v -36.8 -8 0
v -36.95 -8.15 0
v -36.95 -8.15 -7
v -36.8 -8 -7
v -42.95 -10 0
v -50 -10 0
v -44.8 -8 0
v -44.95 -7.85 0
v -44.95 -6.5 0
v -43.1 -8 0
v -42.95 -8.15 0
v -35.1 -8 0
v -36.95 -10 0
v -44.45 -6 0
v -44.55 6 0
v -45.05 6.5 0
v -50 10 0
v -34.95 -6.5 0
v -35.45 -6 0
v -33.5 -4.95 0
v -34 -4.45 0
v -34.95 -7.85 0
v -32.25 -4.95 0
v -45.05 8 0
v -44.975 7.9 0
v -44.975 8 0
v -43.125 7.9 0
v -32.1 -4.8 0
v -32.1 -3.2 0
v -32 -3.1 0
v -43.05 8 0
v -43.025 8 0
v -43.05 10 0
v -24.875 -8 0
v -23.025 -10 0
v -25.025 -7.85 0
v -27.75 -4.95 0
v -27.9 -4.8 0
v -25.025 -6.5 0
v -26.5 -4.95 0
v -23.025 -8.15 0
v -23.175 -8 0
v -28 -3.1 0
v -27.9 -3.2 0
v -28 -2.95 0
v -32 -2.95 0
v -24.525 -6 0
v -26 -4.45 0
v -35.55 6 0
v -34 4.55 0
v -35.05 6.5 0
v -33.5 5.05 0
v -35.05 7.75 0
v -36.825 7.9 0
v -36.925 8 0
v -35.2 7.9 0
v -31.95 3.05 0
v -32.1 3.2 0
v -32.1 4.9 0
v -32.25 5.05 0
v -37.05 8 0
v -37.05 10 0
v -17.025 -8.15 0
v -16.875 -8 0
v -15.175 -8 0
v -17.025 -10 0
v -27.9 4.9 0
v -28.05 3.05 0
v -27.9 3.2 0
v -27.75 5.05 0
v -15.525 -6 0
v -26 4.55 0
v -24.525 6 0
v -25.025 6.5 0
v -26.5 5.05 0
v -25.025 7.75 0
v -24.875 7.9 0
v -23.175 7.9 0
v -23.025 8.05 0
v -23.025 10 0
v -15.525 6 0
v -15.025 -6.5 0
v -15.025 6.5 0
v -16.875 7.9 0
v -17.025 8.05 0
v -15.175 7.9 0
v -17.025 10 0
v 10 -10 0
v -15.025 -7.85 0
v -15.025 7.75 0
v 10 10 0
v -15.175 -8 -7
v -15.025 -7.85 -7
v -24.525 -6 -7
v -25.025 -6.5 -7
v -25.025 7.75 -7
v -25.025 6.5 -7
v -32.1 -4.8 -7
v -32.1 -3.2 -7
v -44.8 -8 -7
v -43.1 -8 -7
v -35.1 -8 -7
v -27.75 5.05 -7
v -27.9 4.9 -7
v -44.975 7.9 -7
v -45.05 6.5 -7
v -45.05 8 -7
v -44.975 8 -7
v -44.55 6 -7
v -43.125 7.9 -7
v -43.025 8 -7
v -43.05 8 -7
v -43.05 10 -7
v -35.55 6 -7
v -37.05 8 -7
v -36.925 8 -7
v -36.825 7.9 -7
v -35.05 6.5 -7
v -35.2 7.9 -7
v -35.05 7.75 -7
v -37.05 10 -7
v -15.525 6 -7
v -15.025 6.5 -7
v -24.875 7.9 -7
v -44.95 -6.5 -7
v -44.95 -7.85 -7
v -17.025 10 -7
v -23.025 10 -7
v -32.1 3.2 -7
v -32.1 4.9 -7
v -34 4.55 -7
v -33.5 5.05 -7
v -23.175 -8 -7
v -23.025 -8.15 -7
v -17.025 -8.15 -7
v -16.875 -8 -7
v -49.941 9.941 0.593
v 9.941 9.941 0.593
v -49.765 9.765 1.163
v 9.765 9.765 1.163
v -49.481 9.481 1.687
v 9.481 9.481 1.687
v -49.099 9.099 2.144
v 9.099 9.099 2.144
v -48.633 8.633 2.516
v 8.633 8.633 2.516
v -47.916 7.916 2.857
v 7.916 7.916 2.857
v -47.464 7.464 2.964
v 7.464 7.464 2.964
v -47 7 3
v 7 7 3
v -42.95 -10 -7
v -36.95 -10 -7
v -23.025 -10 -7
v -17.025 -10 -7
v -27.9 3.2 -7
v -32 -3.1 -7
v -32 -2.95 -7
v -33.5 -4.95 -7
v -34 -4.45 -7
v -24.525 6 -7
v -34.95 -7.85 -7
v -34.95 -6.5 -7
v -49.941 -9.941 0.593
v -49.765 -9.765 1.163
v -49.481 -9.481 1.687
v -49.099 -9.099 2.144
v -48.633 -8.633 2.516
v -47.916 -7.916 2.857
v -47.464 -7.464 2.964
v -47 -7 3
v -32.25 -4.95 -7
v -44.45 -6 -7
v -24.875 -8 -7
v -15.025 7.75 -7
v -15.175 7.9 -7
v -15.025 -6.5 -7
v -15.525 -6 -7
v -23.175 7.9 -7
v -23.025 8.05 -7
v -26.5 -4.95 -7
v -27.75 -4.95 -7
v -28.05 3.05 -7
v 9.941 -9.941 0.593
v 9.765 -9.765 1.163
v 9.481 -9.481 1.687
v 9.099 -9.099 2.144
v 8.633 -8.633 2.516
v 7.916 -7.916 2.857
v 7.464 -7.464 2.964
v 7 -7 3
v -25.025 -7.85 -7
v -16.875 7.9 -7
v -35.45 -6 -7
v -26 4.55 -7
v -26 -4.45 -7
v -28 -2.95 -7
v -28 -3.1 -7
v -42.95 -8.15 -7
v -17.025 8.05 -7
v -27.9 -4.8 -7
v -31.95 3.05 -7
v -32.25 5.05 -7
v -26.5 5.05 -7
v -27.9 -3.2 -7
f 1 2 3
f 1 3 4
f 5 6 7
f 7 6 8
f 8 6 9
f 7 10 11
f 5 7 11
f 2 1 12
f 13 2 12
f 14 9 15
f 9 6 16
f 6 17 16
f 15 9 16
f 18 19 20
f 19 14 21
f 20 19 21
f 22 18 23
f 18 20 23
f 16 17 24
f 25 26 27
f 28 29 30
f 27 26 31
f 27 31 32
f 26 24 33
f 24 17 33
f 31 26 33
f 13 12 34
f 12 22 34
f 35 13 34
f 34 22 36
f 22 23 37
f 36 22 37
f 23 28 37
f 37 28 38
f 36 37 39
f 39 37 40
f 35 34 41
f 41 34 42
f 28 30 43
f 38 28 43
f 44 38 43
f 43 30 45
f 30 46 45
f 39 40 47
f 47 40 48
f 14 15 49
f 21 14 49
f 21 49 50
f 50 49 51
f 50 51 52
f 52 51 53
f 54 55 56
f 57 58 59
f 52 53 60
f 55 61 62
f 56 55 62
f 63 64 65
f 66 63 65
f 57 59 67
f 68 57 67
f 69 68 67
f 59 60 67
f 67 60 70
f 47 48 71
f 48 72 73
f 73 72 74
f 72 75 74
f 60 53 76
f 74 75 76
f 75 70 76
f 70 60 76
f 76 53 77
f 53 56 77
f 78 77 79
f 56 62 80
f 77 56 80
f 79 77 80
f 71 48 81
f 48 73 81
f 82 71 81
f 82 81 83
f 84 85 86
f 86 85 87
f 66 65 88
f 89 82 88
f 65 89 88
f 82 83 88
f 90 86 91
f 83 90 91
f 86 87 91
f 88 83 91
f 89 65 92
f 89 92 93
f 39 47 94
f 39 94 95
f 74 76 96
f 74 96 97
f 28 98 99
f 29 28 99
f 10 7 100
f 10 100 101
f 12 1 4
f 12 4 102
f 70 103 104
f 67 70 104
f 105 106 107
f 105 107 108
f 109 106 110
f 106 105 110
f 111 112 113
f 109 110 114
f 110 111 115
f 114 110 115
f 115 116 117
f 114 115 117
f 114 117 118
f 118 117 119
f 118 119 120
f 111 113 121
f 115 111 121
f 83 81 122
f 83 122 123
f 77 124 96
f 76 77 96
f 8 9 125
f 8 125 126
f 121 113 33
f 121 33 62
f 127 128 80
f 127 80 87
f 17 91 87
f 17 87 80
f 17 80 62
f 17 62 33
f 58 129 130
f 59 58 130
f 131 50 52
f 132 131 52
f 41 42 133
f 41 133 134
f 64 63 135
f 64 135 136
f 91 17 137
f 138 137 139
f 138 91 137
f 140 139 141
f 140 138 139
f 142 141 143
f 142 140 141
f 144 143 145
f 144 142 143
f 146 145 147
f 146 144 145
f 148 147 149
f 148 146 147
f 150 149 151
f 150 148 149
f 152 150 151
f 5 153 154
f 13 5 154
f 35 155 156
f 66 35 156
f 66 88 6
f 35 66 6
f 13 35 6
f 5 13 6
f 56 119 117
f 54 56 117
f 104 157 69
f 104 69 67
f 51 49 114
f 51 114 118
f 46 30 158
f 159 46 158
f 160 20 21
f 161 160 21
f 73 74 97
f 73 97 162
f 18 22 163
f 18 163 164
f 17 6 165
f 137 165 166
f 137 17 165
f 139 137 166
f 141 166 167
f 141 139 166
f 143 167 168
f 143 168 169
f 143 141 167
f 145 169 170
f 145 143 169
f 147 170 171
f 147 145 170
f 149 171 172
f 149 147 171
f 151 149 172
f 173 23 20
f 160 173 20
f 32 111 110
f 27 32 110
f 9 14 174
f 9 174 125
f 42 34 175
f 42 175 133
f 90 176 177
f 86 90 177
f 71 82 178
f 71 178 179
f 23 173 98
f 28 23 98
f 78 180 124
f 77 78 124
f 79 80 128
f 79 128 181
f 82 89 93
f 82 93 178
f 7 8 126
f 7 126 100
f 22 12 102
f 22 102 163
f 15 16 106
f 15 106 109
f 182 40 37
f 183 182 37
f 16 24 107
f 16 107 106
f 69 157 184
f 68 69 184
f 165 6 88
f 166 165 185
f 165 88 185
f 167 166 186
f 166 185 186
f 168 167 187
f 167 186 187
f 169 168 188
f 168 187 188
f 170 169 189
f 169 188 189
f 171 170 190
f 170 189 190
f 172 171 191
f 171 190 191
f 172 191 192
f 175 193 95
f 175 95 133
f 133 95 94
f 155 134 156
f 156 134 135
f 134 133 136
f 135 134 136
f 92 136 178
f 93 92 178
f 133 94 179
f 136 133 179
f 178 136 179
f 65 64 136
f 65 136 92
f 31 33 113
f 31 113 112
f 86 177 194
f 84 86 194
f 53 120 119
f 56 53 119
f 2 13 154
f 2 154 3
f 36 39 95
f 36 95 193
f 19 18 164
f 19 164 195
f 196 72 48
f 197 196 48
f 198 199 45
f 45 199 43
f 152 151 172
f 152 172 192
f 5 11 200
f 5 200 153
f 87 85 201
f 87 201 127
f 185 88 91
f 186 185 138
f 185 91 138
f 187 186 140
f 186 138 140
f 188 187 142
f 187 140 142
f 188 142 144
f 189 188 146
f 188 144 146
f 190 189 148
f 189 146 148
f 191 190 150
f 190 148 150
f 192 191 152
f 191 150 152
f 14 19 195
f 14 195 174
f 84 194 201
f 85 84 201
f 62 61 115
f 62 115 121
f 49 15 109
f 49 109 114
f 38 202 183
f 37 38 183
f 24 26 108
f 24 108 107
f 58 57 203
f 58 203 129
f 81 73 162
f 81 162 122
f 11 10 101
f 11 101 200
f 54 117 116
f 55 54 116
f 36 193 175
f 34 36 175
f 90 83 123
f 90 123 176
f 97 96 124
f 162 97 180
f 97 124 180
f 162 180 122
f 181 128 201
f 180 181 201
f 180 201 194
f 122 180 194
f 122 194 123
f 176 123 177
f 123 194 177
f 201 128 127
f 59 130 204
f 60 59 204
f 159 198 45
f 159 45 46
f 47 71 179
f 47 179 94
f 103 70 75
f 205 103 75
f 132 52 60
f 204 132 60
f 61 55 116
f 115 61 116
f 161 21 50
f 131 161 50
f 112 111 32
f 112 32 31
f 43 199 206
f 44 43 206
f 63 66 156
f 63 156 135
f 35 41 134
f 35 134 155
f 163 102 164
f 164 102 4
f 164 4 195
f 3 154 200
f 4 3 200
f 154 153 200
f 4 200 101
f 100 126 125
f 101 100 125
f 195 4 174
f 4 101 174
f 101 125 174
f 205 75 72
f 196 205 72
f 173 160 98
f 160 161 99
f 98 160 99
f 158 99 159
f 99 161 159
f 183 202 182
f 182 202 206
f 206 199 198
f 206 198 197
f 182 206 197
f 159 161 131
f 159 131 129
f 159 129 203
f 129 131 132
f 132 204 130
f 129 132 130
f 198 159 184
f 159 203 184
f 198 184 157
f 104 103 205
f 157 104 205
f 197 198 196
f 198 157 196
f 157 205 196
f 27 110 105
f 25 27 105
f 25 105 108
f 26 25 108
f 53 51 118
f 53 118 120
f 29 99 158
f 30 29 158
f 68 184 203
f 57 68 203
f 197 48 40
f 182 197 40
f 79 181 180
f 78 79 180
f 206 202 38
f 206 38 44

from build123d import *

# Parameters (mm, degrees)
SKETCH_1_W          = 60
SKETCH_1_H          = 20
EXTRUDE_1_DEPTH     = 3
EXTRUDE_3_DEPTH     = 7
SKETCH_5_W          = 2
SKETCH_5_H          = 0.1
SKETCH_5_W_2        = 4.2
SKETCH_5_H_2        = 2
CUT_EXTRUDE_2_DEPTH = 7
CHAMFER_1_SIZE      = 0.15
FILLET_1_R          = 3


# Some blends are built 0.0001 mm under size
with BuildPart() as part:
    # 草图1 → 凸台-拉伸1 (new body)
    with BuildSketch(Plane.XY):
        with Locations((-20, 0)):
            Rectangle(SKETCH_1_W, SKETCH_1_H)
    extrude(amount=EXTRUDE_1_DEPTH)

    # 草图1<5> → 凸台-拉伸3 (add)
    with BuildSketch(Plane.XY):
        Polygon((-17.025, 10), (-23.025, 10), (-23.025, 8), (-25.025, 8), (-25.025, 6.5), (-24.525, 6), (-15.525, 6), (-15.025, 6.5), (-15.025, 8), (-17.025, 8), align=None)
        Polygon((-37.05, 10), (-43.05, 10), (-43.05, 8), (-45.05, 8), (-45.05, 6.5), (-44.55, 6), (-35.55, 6), (-35.05, 6.5), (-35.05, 8), (-37.05, 8), align=None)
        Polygon((-26, 4.55), (-26, -4.45), (-26.5, -4.95), (-28, -4.95), (-28, -2.95), (-32, -2.95), (-32, -4.95), (-33.5, -4.95), (-34, -4.45), (-34, 4.55), (-33.5, 5.05), (-32, 5.05), (-32, 3.05), (-28, 3.05), (-28, 5.05), (-26.5, 5.05), align=None)
        Polygon((-23.025, -8), (-23.025, -10), (-17.025, -10), (-17.025, -8), (-15.025, -8), (-15.025, -6.5), (-15.525, -6), (-24.525, -6), (-25.025, -6.5), (-25.025, -8), align=None)
        Polygon((-42.95, -8), (-42.95, -10), (-36.95, -10), (-36.95, -8), (-34.95, -8), (-34.95, -6.5), (-35.45, -6), (-44.45, -6), (-44.95, -6.5), (-44.95, -8), align=None)
    extrude(amount=-EXTRUDE_3_DEPTH)

    # 草图5 → 切除-拉伸2 (cut)
    with BuildSketch(Plane(origin=(0, 0, -7), x_dir=(-1, 0, 0), z_dir=(0, 0, -1))):
        with Locations((16.025, 7.95)):
            Rectangle(SKETCH_5_W, SKETCH_5_H)
        with Locations((24.025, 7.95)):
            Rectangle(SKETCH_5_W, SKETCH_5_H)
        with Locations((35.975, 7.95)):
            Rectangle(SKETCH_5_W, SKETCH_5_H)
        with Locations((43.975, 7.95)):
            Rectangle(SKETCH_5_W, SKETCH_5_H)
        with Locations((30, 4.05)):
            Rectangle(SKETCH_5_W_2, SKETCH_5_H_2)
        with Locations((30, -4.05)):
            Rectangle(SKETCH_5_W_2, SKETCH_5_H_2)
    extrude(amount=-CUT_EXTRUDE_2_DEPTH, mode=Mode.SUBTRACT)

    # 倒角1
    # the kernel refuses this chamfer: 0.15 mm, written as the material it adds along each edge
    with BuildSketch(Plane(origin=(-32.1, -3.05, -7), x_dir=(-0.027495876610573042, -0.9996219169112971, 0), z_dir=(0, 0, 1))) as chamfer_1_piece_1_section:
        Polygon((CHAMFER_1_SIZE * 0.999621916911, CHAMFER_1_SIZE * 0.0274958766106), (-CHAMFER_1_SIZE * 0.0274958766106, CHAMFER_1_SIZE * 0.999621916911), (0, 0), align=None)
    chamfer_1_piece_1 = extrude(amount=7, mode=Mode.PRIVATE)
    chamfer_1_piece_1 = split(chamfer_1_piece_1, bisect_by=Plane(origin=(-32, -3.10460455, -3.5), z_dir=(-1, 0, 0)), keep=Keep.TOP, mode=Mode.PRIVATE)
    add(chamfer_1_piece_1)
    with BuildSketch(Plane(origin=(-32.1, -3.05, -7), x_dir=(-0.027495876610573042, -0.9996219169112971, 0), z_dir=(0, 0, 1))) as chamfer_1_piece_2_section:
        Polygon((CHAMFER_1_SIZE * 0.999621916911, CHAMFER_1_SIZE * 0.0274958766106), (-CHAMFER_1_SIZE * 0.0274958766106, CHAMFER_1_SIZE * 0.999621916911), (0, 0), align=None)
    chamfer_1_piece_2 = extrude(amount=7.385752448, mode=Mode.PRIVATE)
    chamfer_1_piece_2 = split(chamfer_1_piece_2, bisect_by=Plane(origin=(-32.060343707, -3.10460455, 0), z_dir=(0, 0, 1)), keep=Keep.TOP, mode=Mode.PRIVATE)
    chamfer_1_piece_2 = split(chamfer_1_piece_2, bisect_by=Plane(origin=(-32, -3.10460455, 0.192876224), z_dir=(-1, 0, 0)), keep=Keep.TOP, mode=Mode.PRIVATE)
    add(chamfer_1_piece_2)
    with BuildSketch(Plane(origin=(-32.1, -3.05, -7), x_dir=(-0.027495876610573042, -0.9996219169112971, 0), z_dir=(0, 0, 1))) as chamfer_1_piece_3_section:
        Polygon((CHAMFER_1_SIZE * 0.999621916911, CHAMFER_1_SIZE * 0.0274958766106), (-CHAMFER_1_SIZE * 0.0274958766106, CHAMFER_1_SIZE * 0.999621916911), (0, 0), align=None)
    chamfer_1_piece_3 = extrude(amount=7.385752448, mode=Mode.PRIVATE)
    chamfer_1_piece_3 = split(chamfer_1_piece_3, bisect_by=Plane(origin=(-31.98101474, -3.063087711, 0), z_dir=(0, 0, 1)), keep=Keep.TOP, mode=Mode.PRIVATE)
    chamfer_1_piece_3 = split(chamfer_1_piece_3, bisect_by=Plane(origin=(-32, -3.063087711, 0.192876224), z_dir=(1, 0, 0)), keep=Keep.TOP, mode=Mode.PRIVATE)
    add(chamfer_1_piece_3)
    with BuildSketch(Plane(origin=(-27.9, -3.05, -7), x_dir=(-0.9996219169112968, 0.027495876610587344, 0), z_dir=(0, 0, 1))) as chamfer_1_piece_4_section:
        Polygon((CHAMFER_1_SIZE * 0.999621916911, CHAMFER_1_SIZE * 0.0274958766106), (-CHAMFER_1_SIZE * 0.0274958766106, CHAMFER_1_SIZE * 0.999621916911), (0, 0), align=None)
    chamfer_1_piece_4 = extrude(amount=7, mode=Mode.PRIVATE)
    chamfer_1_piece_4 = split(chamfer_1_piece_4, bisect_by=Plane(origin=(-28, -3.10460455, -3.5), z_dir=(1, 0, 0)), keep=Keep.TOP, mode=Mode.PRIVATE)
    add(chamfer_1_piece_4)
    with BuildSketch(Plane(origin=(-27.9, -3.05, -7), x_dir=(-0.9996219169112968, 0.027495876610587344, 0), z_dir=(0, 0, 1))) as chamfer_1_piece_5_section:
        Polygon((CHAMFER_1_SIZE * 0.999621916911, CHAMFER_1_SIZE * 0.0274958766106), (-CHAMFER_1_SIZE * 0.0274958766106, CHAMFER_1_SIZE * 0.999621916911), (0, 0), align=None)
    chamfer_1_piece_5 = extrude(amount=7.385752448, mode=Mode.PRIVATE)
    chamfer_1_piece_5 = split(chamfer_1_piece_5, bisect_by=Plane(origin=(-28.01898526, -3.063087711, 0), z_dir=(0, 0, 1)), keep=Keep.TOP, mode=Mode.PRIVATE)
    chamfer_1_piece_5 = split(chamfer_1_piece_5, bisect_by=Plane(origin=(-28, -3.063087711, 0.192876224), z_dir=(-1, 0, 0)), keep=Keep.TOP, mode=Mode.PRIVATE)
    add(chamfer_1_piece_5)
    with BuildSketch(Plane(origin=(-27.9, -3.05, -7), x_dir=(-0.9996219169112968, 0.027495876610587344, 0), z_dir=(0, 0, 1))) as chamfer_1_piece_6_section:
        Polygon((CHAMFER_1_SIZE * 0.999621916911, CHAMFER_1_SIZE * 0.0274958766106), (-CHAMFER_1_SIZE * 0.0274958766106, CHAMFER_1_SIZE * 0.999621916911), (0, 0), align=None)
    chamfer_1_piece_6 = extrude(amount=7.385752448, mode=Mode.PRIVATE)
    chamfer_1_piece_6 = split(chamfer_1_piece_6, bisect_by=Plane(origin=(-27.939656293, -3.10460455, 0), z_dir=(0, 0, 1)), keep=Keep.TOP, mode=Mode.PRIVATE)
    chamfer_1_piece_6 = split(chamfer_1_piece_6, bisect_by=Plane(origin=(-28, -3.10460455, 0.192876224), z_dir=(1, 0, 0)), keep=Keep.TOP, mode=Mode.PRIVATE)
    add(chamfer_1_piece_6)
    with BuildSketch(Plane(origin=(-32.1, 3.05, -7), x_dir=(0.9996219169112968, -0.027495876610587344, 0), z_dir=(0, 0, 1)), Plane(origin=(-27.9, 3.05, -7), x_dir=(0.02749587661059597, 0.9996219169112964, 0), z_dir=(0, 0, 1)), Plane(origin=(-42.975, 7.9, -7), x_dir=(0.027495876610572963, 0.9996219169112971, 0), z_dir=(0, 0, 1)), Plane(origin=(-23.025, 7.9, -7), x_dir=(0.02749587661059597, 0.9996219169112964, 0), z_dir=(0, 0, 1)), Plane(origin=(-17.025, 7.9, -7), x_dir=(0.9996219169112968, -0.027495876610584464, 0), z_dir=(0, 0, 1))) as chamfer_1_piece_7:
        Polygon((CHAMFER_1_SIZE * 0.999621916911, CHAMFER_1_SIZE * 0.0274958766106), (-CHAMFER_1_SIZE * 0.0274958766106, CHAMFER_1_SIZE * 0.999621916911), (0, 0), align=None)
    extrude(amount=7.385752448)
    with BuildSketch(Plane(origin=(-36.975, 7.9, -7), x_dir=(0.9996219169112968, -0.0274958766105851, 0), z_dir=(0, 0, 1))) as chamfer_1_piece_8_section:
        Polygon((CHAMFER_1_SIZE * 0.999621916911, CHAMFER_1_SIZE * 0.0274958766106), (-CHAMFER_1_SIZE * 0.0274958766106, CHAMFER_1_SIZE * 0.999621916911), (0, 0), align=None)
    chamfer_1_piece_8 = extrude(amount=7, mode=Mode.PRIVATE)
    chamfer_1_piece_8 = split(chamfer_1_piece_8, bisect_by=Plane(origin=(-36.92039545, 8, -3.5), z_dir=(0, -1, 0)), keep=Keep.TOP, mode=Mode.PRIVATE)
    add(chamfer_1_piece_8)
    with BuildSketch(Plane(origin=(-36.975, 7.9, -7), x_dir=(0.9996219169112968, -0.0274958766105851, 0), z_dir=(0, 0, 1))) as chamfer_1_piece_9_section:
        Polygon((CHAMFER_1_SIZE * 0.999621916911, CHAMFER_1_SIZE * 0.0274958766106), (-CHAMFER_1_SIZE * 0.0274958766106, CHAMFER_1_SIZE * 0.999621916911), (0, 0), align=None)
    chamfer_1_piece_9 = extrude(amount=7.385752448, mode=Mode.PRIVATE)
    chamfer_1_piece_9 = split(chamfer_1_piece_9, bisect_by=Plane(origin=(-36.92039545, 7.939656293, 0), z_dir=(0, 0, 1)), keep=Keep.TOP, mode=Mode.PRIVATE)
    chamfer_1_piece_9 = split(chamfer_1_piece_9, bisect_by=Plane(origin=(-36.92039545, 8, 0.192876224), z_dir=(0, -1, 0)), keep=Keep.TOP, mode=Mode.PRIVATE)
    add(chamfer_1_piece_9)
    with BuildSketch(Plane(origin=(-36.975, 7.9, -7), x_dir=(0.9996219169112968, -0.0274958766105851, 0), z_dir=(0, 0, 1))) as chamfer_1_piece_10_section:
        Polygon((CHAMFER_1_SIZE * 0.999621916911, CHAMFER_1_SIZE * 0.0274958766106), (-CHAMFER_1_SIZE * 0.0274958766106, CHAMFER_1_SIZE * 0.999621916911), (0, 0), align=None)
    chamfer_1_piece_10 = extrude(amount=7.385752448, mode=Mode.PRIVATE)
    chamfer_1_piece_10 = split(chamfer_1_piece_10, bisect_by=Plane(origin=(-36.961912289, 8.01898526, 0), z_dir=(0, 0, 1)), keep=Keep.TOP, mode=Mode.PRIVATE)
    chamfer_1_piece_10 = split(chamfer_1_piece_10, bisect_by=Plane(origin=(-36.961912289, 8, 0.192876224), z_dir=(0, 1, 0)), keep=Keep.TOP, mode=Mode.PRIVATE)
    add(chamfer_1_piece_10)
    with BuildSketch(Plane(origin=(-36.95, -8, 0.385752448), x_dir=(-0.027495876610572963, -0.9996219169112971, 0), z_dir=(0, 0, -1)), Plane(origin=(-42.95, -8, 0.385752448), x_dir=(-0.9996219169112968, 0.0274958766105851, 0), z_dir=(0, 0, -1)), Plane(origin=(-17.025, -8, 0.385752448), x_dir=(-0.02749587661059597, -0.9996219169112964, 0), z_dir=(0, 0, -1)), Plane(origin=(-23.025, -8, 0.385752448), x_dir=(-0.9996219169112968, 0.027495876610584464, 0), z_dir=(0, 0, -1))) as chamfer_1_piece_11:
        Polygon((CHAMFER_1_SIZE * 0.999621916911, -CHAMFER_1_SIZE * 0.0274958766106), (-CHAMFER_1_SIZE * 0.0274958766106, -CHAMFER_1_SIZE * 0.999621916911), (0, 0), align=None)
    extrude(amount=7.385752448)
    # the kernel refuses this chamfer: 0.15 mm, written as the material it takes off along each edge
    with BuildSketch(Plane(origin=(-32.1, -4.95, -7.385752448), x_dir=(-0.9996219169112968, -0.0274958766105851, 0), z_dir=(0, 0, 1)), Plane(origin=(-32.1, 5.05, -7.385752448), x_dir=(0.027495876610572963, -0.9996219169112971, 0), z_dir=(0, 0, 1)), Plane(origin=(-27.9, 5.05, -7.385752448), x_dir=(0.9996219169112968, 0.027495876610584464, 0), z_dir=(0, 0, 1)), Plane(origin=(-25.025, 7.9, -7.385752448), x_dir=(0.9996219169112968, 0.027495876610584464, 0), z_dir=(0, 0, 1)), Plane(origin=(-35.05, 7.9, -7.385752448), x_dir=(0.027495876610572963, -0.9996219169112971, 0), z_dir=(0, 0, 1)), Plane(origin=(-15.025, 7.9, -7.385752448), x_dir=(0.027495876610584464, -0.9996219169112968, 0), z_dir=(0, 0, 1))) as chamfer_1_2_piece_1:
        Polygon((CHAMFER_1_SIZE * 0.999621916911, -CHAMFER_1_SIZE * 0.0274958766106), (-CHAMFER_1_SIZE * 0.0274958766106, -CHAMFER_1_SIZE * 0.999621916911), (0, 0), align=None)
    extrude(amount=7.385752448, mode=Mode.SUBTRACT)
    with BuildSketch(Plane(origin=(-27.9, -4.95, 0), x_dir=(-0.02749587661059597, 0.9996219169112964, 0), z_dir=(0, 0, -1)), Plane(origin=(-34.95, -8, 0), x_dir=(-0.9996219169112968, -0.0274958766105851, 0), z_dir=(0, 0, -1)), Plane(origin=(-44.95, -8, 0), x_dir=(-0.027495876610572963, 0.9996219169112971, 0), z_dir=(0, 0, -1)), Plane(origin=(-15.025, -8, 0), x_dir=(-0.9996219169112968, -0.027495876610584464, 0), z_dir=(0, 0, -1)), Plane(origin=(-25.025, -8, 0), x_dir=(-0.02749587661059597, 0.9996219169112964, 0), z_dir=(0, 0, -1))) as chamfer_1_2_piece_2:
        Polygon((CHAMFER_1_SIZE * 0.999621916911, CHAMFER_1_SIZE * 0.0274958766106), (-CHAMFER_1_SIZE * 0.0274958766106, CHAMFER_1_SIZE * 0.999621916911), (0, 0), align=None)
    extrude(amount=7.385752448, mode=Mode.SUBTRACT)

    # 圆角1
    fillet_1_edges = [part.edges().sort_by_distance(p)[0] for p in [
        (10, 0, 3),
        (-20, -10, 3),
        (-20, 10, 3),
        (-50, 0, 3),
    ]]
    fillet(fillet_1_edges, radius=FILLET_1_R - 0.0001)  # a hair under: the kernel refuses the full size


solid = part.part
